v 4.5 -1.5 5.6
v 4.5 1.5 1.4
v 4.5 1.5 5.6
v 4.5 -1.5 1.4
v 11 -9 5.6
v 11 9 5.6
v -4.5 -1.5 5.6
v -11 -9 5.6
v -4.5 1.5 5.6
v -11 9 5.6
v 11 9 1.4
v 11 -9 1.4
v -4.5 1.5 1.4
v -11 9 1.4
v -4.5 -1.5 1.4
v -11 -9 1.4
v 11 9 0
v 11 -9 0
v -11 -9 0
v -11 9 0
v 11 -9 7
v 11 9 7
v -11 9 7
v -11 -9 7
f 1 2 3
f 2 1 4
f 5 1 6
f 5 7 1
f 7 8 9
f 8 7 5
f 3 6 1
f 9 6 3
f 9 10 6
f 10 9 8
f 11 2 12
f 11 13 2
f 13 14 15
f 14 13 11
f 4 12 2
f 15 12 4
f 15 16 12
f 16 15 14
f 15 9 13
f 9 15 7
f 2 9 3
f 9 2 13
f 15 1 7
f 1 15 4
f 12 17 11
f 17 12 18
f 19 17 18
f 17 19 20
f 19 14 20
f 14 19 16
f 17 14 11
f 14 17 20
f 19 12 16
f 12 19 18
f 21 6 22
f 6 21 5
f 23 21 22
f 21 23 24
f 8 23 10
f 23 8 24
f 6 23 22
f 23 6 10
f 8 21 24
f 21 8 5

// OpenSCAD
// Gen-H pancake former — 12 needed; 30 AWG ~300–350 t or 26 AWG alt
core_w=9.0; core_h=3.0; flange_od_x=22.0; flange_od_y=18.0; flange_t=1.4; wind_h=4.2; $fn=48;
translate([-core_w/2, -core_h/2, flange_t]) cube([core_w, core_h, wind_h]);
translate([-flange_od_x/2, -flange_od_y/2, 0]) cube([flange_od_x, flange_od_y, flange_t]);
translate([-flange_od_x/2, -flange_od_y/2, flange_t + wind_h]) cube([flange_od_x, flange_od_y, flange_t]);
